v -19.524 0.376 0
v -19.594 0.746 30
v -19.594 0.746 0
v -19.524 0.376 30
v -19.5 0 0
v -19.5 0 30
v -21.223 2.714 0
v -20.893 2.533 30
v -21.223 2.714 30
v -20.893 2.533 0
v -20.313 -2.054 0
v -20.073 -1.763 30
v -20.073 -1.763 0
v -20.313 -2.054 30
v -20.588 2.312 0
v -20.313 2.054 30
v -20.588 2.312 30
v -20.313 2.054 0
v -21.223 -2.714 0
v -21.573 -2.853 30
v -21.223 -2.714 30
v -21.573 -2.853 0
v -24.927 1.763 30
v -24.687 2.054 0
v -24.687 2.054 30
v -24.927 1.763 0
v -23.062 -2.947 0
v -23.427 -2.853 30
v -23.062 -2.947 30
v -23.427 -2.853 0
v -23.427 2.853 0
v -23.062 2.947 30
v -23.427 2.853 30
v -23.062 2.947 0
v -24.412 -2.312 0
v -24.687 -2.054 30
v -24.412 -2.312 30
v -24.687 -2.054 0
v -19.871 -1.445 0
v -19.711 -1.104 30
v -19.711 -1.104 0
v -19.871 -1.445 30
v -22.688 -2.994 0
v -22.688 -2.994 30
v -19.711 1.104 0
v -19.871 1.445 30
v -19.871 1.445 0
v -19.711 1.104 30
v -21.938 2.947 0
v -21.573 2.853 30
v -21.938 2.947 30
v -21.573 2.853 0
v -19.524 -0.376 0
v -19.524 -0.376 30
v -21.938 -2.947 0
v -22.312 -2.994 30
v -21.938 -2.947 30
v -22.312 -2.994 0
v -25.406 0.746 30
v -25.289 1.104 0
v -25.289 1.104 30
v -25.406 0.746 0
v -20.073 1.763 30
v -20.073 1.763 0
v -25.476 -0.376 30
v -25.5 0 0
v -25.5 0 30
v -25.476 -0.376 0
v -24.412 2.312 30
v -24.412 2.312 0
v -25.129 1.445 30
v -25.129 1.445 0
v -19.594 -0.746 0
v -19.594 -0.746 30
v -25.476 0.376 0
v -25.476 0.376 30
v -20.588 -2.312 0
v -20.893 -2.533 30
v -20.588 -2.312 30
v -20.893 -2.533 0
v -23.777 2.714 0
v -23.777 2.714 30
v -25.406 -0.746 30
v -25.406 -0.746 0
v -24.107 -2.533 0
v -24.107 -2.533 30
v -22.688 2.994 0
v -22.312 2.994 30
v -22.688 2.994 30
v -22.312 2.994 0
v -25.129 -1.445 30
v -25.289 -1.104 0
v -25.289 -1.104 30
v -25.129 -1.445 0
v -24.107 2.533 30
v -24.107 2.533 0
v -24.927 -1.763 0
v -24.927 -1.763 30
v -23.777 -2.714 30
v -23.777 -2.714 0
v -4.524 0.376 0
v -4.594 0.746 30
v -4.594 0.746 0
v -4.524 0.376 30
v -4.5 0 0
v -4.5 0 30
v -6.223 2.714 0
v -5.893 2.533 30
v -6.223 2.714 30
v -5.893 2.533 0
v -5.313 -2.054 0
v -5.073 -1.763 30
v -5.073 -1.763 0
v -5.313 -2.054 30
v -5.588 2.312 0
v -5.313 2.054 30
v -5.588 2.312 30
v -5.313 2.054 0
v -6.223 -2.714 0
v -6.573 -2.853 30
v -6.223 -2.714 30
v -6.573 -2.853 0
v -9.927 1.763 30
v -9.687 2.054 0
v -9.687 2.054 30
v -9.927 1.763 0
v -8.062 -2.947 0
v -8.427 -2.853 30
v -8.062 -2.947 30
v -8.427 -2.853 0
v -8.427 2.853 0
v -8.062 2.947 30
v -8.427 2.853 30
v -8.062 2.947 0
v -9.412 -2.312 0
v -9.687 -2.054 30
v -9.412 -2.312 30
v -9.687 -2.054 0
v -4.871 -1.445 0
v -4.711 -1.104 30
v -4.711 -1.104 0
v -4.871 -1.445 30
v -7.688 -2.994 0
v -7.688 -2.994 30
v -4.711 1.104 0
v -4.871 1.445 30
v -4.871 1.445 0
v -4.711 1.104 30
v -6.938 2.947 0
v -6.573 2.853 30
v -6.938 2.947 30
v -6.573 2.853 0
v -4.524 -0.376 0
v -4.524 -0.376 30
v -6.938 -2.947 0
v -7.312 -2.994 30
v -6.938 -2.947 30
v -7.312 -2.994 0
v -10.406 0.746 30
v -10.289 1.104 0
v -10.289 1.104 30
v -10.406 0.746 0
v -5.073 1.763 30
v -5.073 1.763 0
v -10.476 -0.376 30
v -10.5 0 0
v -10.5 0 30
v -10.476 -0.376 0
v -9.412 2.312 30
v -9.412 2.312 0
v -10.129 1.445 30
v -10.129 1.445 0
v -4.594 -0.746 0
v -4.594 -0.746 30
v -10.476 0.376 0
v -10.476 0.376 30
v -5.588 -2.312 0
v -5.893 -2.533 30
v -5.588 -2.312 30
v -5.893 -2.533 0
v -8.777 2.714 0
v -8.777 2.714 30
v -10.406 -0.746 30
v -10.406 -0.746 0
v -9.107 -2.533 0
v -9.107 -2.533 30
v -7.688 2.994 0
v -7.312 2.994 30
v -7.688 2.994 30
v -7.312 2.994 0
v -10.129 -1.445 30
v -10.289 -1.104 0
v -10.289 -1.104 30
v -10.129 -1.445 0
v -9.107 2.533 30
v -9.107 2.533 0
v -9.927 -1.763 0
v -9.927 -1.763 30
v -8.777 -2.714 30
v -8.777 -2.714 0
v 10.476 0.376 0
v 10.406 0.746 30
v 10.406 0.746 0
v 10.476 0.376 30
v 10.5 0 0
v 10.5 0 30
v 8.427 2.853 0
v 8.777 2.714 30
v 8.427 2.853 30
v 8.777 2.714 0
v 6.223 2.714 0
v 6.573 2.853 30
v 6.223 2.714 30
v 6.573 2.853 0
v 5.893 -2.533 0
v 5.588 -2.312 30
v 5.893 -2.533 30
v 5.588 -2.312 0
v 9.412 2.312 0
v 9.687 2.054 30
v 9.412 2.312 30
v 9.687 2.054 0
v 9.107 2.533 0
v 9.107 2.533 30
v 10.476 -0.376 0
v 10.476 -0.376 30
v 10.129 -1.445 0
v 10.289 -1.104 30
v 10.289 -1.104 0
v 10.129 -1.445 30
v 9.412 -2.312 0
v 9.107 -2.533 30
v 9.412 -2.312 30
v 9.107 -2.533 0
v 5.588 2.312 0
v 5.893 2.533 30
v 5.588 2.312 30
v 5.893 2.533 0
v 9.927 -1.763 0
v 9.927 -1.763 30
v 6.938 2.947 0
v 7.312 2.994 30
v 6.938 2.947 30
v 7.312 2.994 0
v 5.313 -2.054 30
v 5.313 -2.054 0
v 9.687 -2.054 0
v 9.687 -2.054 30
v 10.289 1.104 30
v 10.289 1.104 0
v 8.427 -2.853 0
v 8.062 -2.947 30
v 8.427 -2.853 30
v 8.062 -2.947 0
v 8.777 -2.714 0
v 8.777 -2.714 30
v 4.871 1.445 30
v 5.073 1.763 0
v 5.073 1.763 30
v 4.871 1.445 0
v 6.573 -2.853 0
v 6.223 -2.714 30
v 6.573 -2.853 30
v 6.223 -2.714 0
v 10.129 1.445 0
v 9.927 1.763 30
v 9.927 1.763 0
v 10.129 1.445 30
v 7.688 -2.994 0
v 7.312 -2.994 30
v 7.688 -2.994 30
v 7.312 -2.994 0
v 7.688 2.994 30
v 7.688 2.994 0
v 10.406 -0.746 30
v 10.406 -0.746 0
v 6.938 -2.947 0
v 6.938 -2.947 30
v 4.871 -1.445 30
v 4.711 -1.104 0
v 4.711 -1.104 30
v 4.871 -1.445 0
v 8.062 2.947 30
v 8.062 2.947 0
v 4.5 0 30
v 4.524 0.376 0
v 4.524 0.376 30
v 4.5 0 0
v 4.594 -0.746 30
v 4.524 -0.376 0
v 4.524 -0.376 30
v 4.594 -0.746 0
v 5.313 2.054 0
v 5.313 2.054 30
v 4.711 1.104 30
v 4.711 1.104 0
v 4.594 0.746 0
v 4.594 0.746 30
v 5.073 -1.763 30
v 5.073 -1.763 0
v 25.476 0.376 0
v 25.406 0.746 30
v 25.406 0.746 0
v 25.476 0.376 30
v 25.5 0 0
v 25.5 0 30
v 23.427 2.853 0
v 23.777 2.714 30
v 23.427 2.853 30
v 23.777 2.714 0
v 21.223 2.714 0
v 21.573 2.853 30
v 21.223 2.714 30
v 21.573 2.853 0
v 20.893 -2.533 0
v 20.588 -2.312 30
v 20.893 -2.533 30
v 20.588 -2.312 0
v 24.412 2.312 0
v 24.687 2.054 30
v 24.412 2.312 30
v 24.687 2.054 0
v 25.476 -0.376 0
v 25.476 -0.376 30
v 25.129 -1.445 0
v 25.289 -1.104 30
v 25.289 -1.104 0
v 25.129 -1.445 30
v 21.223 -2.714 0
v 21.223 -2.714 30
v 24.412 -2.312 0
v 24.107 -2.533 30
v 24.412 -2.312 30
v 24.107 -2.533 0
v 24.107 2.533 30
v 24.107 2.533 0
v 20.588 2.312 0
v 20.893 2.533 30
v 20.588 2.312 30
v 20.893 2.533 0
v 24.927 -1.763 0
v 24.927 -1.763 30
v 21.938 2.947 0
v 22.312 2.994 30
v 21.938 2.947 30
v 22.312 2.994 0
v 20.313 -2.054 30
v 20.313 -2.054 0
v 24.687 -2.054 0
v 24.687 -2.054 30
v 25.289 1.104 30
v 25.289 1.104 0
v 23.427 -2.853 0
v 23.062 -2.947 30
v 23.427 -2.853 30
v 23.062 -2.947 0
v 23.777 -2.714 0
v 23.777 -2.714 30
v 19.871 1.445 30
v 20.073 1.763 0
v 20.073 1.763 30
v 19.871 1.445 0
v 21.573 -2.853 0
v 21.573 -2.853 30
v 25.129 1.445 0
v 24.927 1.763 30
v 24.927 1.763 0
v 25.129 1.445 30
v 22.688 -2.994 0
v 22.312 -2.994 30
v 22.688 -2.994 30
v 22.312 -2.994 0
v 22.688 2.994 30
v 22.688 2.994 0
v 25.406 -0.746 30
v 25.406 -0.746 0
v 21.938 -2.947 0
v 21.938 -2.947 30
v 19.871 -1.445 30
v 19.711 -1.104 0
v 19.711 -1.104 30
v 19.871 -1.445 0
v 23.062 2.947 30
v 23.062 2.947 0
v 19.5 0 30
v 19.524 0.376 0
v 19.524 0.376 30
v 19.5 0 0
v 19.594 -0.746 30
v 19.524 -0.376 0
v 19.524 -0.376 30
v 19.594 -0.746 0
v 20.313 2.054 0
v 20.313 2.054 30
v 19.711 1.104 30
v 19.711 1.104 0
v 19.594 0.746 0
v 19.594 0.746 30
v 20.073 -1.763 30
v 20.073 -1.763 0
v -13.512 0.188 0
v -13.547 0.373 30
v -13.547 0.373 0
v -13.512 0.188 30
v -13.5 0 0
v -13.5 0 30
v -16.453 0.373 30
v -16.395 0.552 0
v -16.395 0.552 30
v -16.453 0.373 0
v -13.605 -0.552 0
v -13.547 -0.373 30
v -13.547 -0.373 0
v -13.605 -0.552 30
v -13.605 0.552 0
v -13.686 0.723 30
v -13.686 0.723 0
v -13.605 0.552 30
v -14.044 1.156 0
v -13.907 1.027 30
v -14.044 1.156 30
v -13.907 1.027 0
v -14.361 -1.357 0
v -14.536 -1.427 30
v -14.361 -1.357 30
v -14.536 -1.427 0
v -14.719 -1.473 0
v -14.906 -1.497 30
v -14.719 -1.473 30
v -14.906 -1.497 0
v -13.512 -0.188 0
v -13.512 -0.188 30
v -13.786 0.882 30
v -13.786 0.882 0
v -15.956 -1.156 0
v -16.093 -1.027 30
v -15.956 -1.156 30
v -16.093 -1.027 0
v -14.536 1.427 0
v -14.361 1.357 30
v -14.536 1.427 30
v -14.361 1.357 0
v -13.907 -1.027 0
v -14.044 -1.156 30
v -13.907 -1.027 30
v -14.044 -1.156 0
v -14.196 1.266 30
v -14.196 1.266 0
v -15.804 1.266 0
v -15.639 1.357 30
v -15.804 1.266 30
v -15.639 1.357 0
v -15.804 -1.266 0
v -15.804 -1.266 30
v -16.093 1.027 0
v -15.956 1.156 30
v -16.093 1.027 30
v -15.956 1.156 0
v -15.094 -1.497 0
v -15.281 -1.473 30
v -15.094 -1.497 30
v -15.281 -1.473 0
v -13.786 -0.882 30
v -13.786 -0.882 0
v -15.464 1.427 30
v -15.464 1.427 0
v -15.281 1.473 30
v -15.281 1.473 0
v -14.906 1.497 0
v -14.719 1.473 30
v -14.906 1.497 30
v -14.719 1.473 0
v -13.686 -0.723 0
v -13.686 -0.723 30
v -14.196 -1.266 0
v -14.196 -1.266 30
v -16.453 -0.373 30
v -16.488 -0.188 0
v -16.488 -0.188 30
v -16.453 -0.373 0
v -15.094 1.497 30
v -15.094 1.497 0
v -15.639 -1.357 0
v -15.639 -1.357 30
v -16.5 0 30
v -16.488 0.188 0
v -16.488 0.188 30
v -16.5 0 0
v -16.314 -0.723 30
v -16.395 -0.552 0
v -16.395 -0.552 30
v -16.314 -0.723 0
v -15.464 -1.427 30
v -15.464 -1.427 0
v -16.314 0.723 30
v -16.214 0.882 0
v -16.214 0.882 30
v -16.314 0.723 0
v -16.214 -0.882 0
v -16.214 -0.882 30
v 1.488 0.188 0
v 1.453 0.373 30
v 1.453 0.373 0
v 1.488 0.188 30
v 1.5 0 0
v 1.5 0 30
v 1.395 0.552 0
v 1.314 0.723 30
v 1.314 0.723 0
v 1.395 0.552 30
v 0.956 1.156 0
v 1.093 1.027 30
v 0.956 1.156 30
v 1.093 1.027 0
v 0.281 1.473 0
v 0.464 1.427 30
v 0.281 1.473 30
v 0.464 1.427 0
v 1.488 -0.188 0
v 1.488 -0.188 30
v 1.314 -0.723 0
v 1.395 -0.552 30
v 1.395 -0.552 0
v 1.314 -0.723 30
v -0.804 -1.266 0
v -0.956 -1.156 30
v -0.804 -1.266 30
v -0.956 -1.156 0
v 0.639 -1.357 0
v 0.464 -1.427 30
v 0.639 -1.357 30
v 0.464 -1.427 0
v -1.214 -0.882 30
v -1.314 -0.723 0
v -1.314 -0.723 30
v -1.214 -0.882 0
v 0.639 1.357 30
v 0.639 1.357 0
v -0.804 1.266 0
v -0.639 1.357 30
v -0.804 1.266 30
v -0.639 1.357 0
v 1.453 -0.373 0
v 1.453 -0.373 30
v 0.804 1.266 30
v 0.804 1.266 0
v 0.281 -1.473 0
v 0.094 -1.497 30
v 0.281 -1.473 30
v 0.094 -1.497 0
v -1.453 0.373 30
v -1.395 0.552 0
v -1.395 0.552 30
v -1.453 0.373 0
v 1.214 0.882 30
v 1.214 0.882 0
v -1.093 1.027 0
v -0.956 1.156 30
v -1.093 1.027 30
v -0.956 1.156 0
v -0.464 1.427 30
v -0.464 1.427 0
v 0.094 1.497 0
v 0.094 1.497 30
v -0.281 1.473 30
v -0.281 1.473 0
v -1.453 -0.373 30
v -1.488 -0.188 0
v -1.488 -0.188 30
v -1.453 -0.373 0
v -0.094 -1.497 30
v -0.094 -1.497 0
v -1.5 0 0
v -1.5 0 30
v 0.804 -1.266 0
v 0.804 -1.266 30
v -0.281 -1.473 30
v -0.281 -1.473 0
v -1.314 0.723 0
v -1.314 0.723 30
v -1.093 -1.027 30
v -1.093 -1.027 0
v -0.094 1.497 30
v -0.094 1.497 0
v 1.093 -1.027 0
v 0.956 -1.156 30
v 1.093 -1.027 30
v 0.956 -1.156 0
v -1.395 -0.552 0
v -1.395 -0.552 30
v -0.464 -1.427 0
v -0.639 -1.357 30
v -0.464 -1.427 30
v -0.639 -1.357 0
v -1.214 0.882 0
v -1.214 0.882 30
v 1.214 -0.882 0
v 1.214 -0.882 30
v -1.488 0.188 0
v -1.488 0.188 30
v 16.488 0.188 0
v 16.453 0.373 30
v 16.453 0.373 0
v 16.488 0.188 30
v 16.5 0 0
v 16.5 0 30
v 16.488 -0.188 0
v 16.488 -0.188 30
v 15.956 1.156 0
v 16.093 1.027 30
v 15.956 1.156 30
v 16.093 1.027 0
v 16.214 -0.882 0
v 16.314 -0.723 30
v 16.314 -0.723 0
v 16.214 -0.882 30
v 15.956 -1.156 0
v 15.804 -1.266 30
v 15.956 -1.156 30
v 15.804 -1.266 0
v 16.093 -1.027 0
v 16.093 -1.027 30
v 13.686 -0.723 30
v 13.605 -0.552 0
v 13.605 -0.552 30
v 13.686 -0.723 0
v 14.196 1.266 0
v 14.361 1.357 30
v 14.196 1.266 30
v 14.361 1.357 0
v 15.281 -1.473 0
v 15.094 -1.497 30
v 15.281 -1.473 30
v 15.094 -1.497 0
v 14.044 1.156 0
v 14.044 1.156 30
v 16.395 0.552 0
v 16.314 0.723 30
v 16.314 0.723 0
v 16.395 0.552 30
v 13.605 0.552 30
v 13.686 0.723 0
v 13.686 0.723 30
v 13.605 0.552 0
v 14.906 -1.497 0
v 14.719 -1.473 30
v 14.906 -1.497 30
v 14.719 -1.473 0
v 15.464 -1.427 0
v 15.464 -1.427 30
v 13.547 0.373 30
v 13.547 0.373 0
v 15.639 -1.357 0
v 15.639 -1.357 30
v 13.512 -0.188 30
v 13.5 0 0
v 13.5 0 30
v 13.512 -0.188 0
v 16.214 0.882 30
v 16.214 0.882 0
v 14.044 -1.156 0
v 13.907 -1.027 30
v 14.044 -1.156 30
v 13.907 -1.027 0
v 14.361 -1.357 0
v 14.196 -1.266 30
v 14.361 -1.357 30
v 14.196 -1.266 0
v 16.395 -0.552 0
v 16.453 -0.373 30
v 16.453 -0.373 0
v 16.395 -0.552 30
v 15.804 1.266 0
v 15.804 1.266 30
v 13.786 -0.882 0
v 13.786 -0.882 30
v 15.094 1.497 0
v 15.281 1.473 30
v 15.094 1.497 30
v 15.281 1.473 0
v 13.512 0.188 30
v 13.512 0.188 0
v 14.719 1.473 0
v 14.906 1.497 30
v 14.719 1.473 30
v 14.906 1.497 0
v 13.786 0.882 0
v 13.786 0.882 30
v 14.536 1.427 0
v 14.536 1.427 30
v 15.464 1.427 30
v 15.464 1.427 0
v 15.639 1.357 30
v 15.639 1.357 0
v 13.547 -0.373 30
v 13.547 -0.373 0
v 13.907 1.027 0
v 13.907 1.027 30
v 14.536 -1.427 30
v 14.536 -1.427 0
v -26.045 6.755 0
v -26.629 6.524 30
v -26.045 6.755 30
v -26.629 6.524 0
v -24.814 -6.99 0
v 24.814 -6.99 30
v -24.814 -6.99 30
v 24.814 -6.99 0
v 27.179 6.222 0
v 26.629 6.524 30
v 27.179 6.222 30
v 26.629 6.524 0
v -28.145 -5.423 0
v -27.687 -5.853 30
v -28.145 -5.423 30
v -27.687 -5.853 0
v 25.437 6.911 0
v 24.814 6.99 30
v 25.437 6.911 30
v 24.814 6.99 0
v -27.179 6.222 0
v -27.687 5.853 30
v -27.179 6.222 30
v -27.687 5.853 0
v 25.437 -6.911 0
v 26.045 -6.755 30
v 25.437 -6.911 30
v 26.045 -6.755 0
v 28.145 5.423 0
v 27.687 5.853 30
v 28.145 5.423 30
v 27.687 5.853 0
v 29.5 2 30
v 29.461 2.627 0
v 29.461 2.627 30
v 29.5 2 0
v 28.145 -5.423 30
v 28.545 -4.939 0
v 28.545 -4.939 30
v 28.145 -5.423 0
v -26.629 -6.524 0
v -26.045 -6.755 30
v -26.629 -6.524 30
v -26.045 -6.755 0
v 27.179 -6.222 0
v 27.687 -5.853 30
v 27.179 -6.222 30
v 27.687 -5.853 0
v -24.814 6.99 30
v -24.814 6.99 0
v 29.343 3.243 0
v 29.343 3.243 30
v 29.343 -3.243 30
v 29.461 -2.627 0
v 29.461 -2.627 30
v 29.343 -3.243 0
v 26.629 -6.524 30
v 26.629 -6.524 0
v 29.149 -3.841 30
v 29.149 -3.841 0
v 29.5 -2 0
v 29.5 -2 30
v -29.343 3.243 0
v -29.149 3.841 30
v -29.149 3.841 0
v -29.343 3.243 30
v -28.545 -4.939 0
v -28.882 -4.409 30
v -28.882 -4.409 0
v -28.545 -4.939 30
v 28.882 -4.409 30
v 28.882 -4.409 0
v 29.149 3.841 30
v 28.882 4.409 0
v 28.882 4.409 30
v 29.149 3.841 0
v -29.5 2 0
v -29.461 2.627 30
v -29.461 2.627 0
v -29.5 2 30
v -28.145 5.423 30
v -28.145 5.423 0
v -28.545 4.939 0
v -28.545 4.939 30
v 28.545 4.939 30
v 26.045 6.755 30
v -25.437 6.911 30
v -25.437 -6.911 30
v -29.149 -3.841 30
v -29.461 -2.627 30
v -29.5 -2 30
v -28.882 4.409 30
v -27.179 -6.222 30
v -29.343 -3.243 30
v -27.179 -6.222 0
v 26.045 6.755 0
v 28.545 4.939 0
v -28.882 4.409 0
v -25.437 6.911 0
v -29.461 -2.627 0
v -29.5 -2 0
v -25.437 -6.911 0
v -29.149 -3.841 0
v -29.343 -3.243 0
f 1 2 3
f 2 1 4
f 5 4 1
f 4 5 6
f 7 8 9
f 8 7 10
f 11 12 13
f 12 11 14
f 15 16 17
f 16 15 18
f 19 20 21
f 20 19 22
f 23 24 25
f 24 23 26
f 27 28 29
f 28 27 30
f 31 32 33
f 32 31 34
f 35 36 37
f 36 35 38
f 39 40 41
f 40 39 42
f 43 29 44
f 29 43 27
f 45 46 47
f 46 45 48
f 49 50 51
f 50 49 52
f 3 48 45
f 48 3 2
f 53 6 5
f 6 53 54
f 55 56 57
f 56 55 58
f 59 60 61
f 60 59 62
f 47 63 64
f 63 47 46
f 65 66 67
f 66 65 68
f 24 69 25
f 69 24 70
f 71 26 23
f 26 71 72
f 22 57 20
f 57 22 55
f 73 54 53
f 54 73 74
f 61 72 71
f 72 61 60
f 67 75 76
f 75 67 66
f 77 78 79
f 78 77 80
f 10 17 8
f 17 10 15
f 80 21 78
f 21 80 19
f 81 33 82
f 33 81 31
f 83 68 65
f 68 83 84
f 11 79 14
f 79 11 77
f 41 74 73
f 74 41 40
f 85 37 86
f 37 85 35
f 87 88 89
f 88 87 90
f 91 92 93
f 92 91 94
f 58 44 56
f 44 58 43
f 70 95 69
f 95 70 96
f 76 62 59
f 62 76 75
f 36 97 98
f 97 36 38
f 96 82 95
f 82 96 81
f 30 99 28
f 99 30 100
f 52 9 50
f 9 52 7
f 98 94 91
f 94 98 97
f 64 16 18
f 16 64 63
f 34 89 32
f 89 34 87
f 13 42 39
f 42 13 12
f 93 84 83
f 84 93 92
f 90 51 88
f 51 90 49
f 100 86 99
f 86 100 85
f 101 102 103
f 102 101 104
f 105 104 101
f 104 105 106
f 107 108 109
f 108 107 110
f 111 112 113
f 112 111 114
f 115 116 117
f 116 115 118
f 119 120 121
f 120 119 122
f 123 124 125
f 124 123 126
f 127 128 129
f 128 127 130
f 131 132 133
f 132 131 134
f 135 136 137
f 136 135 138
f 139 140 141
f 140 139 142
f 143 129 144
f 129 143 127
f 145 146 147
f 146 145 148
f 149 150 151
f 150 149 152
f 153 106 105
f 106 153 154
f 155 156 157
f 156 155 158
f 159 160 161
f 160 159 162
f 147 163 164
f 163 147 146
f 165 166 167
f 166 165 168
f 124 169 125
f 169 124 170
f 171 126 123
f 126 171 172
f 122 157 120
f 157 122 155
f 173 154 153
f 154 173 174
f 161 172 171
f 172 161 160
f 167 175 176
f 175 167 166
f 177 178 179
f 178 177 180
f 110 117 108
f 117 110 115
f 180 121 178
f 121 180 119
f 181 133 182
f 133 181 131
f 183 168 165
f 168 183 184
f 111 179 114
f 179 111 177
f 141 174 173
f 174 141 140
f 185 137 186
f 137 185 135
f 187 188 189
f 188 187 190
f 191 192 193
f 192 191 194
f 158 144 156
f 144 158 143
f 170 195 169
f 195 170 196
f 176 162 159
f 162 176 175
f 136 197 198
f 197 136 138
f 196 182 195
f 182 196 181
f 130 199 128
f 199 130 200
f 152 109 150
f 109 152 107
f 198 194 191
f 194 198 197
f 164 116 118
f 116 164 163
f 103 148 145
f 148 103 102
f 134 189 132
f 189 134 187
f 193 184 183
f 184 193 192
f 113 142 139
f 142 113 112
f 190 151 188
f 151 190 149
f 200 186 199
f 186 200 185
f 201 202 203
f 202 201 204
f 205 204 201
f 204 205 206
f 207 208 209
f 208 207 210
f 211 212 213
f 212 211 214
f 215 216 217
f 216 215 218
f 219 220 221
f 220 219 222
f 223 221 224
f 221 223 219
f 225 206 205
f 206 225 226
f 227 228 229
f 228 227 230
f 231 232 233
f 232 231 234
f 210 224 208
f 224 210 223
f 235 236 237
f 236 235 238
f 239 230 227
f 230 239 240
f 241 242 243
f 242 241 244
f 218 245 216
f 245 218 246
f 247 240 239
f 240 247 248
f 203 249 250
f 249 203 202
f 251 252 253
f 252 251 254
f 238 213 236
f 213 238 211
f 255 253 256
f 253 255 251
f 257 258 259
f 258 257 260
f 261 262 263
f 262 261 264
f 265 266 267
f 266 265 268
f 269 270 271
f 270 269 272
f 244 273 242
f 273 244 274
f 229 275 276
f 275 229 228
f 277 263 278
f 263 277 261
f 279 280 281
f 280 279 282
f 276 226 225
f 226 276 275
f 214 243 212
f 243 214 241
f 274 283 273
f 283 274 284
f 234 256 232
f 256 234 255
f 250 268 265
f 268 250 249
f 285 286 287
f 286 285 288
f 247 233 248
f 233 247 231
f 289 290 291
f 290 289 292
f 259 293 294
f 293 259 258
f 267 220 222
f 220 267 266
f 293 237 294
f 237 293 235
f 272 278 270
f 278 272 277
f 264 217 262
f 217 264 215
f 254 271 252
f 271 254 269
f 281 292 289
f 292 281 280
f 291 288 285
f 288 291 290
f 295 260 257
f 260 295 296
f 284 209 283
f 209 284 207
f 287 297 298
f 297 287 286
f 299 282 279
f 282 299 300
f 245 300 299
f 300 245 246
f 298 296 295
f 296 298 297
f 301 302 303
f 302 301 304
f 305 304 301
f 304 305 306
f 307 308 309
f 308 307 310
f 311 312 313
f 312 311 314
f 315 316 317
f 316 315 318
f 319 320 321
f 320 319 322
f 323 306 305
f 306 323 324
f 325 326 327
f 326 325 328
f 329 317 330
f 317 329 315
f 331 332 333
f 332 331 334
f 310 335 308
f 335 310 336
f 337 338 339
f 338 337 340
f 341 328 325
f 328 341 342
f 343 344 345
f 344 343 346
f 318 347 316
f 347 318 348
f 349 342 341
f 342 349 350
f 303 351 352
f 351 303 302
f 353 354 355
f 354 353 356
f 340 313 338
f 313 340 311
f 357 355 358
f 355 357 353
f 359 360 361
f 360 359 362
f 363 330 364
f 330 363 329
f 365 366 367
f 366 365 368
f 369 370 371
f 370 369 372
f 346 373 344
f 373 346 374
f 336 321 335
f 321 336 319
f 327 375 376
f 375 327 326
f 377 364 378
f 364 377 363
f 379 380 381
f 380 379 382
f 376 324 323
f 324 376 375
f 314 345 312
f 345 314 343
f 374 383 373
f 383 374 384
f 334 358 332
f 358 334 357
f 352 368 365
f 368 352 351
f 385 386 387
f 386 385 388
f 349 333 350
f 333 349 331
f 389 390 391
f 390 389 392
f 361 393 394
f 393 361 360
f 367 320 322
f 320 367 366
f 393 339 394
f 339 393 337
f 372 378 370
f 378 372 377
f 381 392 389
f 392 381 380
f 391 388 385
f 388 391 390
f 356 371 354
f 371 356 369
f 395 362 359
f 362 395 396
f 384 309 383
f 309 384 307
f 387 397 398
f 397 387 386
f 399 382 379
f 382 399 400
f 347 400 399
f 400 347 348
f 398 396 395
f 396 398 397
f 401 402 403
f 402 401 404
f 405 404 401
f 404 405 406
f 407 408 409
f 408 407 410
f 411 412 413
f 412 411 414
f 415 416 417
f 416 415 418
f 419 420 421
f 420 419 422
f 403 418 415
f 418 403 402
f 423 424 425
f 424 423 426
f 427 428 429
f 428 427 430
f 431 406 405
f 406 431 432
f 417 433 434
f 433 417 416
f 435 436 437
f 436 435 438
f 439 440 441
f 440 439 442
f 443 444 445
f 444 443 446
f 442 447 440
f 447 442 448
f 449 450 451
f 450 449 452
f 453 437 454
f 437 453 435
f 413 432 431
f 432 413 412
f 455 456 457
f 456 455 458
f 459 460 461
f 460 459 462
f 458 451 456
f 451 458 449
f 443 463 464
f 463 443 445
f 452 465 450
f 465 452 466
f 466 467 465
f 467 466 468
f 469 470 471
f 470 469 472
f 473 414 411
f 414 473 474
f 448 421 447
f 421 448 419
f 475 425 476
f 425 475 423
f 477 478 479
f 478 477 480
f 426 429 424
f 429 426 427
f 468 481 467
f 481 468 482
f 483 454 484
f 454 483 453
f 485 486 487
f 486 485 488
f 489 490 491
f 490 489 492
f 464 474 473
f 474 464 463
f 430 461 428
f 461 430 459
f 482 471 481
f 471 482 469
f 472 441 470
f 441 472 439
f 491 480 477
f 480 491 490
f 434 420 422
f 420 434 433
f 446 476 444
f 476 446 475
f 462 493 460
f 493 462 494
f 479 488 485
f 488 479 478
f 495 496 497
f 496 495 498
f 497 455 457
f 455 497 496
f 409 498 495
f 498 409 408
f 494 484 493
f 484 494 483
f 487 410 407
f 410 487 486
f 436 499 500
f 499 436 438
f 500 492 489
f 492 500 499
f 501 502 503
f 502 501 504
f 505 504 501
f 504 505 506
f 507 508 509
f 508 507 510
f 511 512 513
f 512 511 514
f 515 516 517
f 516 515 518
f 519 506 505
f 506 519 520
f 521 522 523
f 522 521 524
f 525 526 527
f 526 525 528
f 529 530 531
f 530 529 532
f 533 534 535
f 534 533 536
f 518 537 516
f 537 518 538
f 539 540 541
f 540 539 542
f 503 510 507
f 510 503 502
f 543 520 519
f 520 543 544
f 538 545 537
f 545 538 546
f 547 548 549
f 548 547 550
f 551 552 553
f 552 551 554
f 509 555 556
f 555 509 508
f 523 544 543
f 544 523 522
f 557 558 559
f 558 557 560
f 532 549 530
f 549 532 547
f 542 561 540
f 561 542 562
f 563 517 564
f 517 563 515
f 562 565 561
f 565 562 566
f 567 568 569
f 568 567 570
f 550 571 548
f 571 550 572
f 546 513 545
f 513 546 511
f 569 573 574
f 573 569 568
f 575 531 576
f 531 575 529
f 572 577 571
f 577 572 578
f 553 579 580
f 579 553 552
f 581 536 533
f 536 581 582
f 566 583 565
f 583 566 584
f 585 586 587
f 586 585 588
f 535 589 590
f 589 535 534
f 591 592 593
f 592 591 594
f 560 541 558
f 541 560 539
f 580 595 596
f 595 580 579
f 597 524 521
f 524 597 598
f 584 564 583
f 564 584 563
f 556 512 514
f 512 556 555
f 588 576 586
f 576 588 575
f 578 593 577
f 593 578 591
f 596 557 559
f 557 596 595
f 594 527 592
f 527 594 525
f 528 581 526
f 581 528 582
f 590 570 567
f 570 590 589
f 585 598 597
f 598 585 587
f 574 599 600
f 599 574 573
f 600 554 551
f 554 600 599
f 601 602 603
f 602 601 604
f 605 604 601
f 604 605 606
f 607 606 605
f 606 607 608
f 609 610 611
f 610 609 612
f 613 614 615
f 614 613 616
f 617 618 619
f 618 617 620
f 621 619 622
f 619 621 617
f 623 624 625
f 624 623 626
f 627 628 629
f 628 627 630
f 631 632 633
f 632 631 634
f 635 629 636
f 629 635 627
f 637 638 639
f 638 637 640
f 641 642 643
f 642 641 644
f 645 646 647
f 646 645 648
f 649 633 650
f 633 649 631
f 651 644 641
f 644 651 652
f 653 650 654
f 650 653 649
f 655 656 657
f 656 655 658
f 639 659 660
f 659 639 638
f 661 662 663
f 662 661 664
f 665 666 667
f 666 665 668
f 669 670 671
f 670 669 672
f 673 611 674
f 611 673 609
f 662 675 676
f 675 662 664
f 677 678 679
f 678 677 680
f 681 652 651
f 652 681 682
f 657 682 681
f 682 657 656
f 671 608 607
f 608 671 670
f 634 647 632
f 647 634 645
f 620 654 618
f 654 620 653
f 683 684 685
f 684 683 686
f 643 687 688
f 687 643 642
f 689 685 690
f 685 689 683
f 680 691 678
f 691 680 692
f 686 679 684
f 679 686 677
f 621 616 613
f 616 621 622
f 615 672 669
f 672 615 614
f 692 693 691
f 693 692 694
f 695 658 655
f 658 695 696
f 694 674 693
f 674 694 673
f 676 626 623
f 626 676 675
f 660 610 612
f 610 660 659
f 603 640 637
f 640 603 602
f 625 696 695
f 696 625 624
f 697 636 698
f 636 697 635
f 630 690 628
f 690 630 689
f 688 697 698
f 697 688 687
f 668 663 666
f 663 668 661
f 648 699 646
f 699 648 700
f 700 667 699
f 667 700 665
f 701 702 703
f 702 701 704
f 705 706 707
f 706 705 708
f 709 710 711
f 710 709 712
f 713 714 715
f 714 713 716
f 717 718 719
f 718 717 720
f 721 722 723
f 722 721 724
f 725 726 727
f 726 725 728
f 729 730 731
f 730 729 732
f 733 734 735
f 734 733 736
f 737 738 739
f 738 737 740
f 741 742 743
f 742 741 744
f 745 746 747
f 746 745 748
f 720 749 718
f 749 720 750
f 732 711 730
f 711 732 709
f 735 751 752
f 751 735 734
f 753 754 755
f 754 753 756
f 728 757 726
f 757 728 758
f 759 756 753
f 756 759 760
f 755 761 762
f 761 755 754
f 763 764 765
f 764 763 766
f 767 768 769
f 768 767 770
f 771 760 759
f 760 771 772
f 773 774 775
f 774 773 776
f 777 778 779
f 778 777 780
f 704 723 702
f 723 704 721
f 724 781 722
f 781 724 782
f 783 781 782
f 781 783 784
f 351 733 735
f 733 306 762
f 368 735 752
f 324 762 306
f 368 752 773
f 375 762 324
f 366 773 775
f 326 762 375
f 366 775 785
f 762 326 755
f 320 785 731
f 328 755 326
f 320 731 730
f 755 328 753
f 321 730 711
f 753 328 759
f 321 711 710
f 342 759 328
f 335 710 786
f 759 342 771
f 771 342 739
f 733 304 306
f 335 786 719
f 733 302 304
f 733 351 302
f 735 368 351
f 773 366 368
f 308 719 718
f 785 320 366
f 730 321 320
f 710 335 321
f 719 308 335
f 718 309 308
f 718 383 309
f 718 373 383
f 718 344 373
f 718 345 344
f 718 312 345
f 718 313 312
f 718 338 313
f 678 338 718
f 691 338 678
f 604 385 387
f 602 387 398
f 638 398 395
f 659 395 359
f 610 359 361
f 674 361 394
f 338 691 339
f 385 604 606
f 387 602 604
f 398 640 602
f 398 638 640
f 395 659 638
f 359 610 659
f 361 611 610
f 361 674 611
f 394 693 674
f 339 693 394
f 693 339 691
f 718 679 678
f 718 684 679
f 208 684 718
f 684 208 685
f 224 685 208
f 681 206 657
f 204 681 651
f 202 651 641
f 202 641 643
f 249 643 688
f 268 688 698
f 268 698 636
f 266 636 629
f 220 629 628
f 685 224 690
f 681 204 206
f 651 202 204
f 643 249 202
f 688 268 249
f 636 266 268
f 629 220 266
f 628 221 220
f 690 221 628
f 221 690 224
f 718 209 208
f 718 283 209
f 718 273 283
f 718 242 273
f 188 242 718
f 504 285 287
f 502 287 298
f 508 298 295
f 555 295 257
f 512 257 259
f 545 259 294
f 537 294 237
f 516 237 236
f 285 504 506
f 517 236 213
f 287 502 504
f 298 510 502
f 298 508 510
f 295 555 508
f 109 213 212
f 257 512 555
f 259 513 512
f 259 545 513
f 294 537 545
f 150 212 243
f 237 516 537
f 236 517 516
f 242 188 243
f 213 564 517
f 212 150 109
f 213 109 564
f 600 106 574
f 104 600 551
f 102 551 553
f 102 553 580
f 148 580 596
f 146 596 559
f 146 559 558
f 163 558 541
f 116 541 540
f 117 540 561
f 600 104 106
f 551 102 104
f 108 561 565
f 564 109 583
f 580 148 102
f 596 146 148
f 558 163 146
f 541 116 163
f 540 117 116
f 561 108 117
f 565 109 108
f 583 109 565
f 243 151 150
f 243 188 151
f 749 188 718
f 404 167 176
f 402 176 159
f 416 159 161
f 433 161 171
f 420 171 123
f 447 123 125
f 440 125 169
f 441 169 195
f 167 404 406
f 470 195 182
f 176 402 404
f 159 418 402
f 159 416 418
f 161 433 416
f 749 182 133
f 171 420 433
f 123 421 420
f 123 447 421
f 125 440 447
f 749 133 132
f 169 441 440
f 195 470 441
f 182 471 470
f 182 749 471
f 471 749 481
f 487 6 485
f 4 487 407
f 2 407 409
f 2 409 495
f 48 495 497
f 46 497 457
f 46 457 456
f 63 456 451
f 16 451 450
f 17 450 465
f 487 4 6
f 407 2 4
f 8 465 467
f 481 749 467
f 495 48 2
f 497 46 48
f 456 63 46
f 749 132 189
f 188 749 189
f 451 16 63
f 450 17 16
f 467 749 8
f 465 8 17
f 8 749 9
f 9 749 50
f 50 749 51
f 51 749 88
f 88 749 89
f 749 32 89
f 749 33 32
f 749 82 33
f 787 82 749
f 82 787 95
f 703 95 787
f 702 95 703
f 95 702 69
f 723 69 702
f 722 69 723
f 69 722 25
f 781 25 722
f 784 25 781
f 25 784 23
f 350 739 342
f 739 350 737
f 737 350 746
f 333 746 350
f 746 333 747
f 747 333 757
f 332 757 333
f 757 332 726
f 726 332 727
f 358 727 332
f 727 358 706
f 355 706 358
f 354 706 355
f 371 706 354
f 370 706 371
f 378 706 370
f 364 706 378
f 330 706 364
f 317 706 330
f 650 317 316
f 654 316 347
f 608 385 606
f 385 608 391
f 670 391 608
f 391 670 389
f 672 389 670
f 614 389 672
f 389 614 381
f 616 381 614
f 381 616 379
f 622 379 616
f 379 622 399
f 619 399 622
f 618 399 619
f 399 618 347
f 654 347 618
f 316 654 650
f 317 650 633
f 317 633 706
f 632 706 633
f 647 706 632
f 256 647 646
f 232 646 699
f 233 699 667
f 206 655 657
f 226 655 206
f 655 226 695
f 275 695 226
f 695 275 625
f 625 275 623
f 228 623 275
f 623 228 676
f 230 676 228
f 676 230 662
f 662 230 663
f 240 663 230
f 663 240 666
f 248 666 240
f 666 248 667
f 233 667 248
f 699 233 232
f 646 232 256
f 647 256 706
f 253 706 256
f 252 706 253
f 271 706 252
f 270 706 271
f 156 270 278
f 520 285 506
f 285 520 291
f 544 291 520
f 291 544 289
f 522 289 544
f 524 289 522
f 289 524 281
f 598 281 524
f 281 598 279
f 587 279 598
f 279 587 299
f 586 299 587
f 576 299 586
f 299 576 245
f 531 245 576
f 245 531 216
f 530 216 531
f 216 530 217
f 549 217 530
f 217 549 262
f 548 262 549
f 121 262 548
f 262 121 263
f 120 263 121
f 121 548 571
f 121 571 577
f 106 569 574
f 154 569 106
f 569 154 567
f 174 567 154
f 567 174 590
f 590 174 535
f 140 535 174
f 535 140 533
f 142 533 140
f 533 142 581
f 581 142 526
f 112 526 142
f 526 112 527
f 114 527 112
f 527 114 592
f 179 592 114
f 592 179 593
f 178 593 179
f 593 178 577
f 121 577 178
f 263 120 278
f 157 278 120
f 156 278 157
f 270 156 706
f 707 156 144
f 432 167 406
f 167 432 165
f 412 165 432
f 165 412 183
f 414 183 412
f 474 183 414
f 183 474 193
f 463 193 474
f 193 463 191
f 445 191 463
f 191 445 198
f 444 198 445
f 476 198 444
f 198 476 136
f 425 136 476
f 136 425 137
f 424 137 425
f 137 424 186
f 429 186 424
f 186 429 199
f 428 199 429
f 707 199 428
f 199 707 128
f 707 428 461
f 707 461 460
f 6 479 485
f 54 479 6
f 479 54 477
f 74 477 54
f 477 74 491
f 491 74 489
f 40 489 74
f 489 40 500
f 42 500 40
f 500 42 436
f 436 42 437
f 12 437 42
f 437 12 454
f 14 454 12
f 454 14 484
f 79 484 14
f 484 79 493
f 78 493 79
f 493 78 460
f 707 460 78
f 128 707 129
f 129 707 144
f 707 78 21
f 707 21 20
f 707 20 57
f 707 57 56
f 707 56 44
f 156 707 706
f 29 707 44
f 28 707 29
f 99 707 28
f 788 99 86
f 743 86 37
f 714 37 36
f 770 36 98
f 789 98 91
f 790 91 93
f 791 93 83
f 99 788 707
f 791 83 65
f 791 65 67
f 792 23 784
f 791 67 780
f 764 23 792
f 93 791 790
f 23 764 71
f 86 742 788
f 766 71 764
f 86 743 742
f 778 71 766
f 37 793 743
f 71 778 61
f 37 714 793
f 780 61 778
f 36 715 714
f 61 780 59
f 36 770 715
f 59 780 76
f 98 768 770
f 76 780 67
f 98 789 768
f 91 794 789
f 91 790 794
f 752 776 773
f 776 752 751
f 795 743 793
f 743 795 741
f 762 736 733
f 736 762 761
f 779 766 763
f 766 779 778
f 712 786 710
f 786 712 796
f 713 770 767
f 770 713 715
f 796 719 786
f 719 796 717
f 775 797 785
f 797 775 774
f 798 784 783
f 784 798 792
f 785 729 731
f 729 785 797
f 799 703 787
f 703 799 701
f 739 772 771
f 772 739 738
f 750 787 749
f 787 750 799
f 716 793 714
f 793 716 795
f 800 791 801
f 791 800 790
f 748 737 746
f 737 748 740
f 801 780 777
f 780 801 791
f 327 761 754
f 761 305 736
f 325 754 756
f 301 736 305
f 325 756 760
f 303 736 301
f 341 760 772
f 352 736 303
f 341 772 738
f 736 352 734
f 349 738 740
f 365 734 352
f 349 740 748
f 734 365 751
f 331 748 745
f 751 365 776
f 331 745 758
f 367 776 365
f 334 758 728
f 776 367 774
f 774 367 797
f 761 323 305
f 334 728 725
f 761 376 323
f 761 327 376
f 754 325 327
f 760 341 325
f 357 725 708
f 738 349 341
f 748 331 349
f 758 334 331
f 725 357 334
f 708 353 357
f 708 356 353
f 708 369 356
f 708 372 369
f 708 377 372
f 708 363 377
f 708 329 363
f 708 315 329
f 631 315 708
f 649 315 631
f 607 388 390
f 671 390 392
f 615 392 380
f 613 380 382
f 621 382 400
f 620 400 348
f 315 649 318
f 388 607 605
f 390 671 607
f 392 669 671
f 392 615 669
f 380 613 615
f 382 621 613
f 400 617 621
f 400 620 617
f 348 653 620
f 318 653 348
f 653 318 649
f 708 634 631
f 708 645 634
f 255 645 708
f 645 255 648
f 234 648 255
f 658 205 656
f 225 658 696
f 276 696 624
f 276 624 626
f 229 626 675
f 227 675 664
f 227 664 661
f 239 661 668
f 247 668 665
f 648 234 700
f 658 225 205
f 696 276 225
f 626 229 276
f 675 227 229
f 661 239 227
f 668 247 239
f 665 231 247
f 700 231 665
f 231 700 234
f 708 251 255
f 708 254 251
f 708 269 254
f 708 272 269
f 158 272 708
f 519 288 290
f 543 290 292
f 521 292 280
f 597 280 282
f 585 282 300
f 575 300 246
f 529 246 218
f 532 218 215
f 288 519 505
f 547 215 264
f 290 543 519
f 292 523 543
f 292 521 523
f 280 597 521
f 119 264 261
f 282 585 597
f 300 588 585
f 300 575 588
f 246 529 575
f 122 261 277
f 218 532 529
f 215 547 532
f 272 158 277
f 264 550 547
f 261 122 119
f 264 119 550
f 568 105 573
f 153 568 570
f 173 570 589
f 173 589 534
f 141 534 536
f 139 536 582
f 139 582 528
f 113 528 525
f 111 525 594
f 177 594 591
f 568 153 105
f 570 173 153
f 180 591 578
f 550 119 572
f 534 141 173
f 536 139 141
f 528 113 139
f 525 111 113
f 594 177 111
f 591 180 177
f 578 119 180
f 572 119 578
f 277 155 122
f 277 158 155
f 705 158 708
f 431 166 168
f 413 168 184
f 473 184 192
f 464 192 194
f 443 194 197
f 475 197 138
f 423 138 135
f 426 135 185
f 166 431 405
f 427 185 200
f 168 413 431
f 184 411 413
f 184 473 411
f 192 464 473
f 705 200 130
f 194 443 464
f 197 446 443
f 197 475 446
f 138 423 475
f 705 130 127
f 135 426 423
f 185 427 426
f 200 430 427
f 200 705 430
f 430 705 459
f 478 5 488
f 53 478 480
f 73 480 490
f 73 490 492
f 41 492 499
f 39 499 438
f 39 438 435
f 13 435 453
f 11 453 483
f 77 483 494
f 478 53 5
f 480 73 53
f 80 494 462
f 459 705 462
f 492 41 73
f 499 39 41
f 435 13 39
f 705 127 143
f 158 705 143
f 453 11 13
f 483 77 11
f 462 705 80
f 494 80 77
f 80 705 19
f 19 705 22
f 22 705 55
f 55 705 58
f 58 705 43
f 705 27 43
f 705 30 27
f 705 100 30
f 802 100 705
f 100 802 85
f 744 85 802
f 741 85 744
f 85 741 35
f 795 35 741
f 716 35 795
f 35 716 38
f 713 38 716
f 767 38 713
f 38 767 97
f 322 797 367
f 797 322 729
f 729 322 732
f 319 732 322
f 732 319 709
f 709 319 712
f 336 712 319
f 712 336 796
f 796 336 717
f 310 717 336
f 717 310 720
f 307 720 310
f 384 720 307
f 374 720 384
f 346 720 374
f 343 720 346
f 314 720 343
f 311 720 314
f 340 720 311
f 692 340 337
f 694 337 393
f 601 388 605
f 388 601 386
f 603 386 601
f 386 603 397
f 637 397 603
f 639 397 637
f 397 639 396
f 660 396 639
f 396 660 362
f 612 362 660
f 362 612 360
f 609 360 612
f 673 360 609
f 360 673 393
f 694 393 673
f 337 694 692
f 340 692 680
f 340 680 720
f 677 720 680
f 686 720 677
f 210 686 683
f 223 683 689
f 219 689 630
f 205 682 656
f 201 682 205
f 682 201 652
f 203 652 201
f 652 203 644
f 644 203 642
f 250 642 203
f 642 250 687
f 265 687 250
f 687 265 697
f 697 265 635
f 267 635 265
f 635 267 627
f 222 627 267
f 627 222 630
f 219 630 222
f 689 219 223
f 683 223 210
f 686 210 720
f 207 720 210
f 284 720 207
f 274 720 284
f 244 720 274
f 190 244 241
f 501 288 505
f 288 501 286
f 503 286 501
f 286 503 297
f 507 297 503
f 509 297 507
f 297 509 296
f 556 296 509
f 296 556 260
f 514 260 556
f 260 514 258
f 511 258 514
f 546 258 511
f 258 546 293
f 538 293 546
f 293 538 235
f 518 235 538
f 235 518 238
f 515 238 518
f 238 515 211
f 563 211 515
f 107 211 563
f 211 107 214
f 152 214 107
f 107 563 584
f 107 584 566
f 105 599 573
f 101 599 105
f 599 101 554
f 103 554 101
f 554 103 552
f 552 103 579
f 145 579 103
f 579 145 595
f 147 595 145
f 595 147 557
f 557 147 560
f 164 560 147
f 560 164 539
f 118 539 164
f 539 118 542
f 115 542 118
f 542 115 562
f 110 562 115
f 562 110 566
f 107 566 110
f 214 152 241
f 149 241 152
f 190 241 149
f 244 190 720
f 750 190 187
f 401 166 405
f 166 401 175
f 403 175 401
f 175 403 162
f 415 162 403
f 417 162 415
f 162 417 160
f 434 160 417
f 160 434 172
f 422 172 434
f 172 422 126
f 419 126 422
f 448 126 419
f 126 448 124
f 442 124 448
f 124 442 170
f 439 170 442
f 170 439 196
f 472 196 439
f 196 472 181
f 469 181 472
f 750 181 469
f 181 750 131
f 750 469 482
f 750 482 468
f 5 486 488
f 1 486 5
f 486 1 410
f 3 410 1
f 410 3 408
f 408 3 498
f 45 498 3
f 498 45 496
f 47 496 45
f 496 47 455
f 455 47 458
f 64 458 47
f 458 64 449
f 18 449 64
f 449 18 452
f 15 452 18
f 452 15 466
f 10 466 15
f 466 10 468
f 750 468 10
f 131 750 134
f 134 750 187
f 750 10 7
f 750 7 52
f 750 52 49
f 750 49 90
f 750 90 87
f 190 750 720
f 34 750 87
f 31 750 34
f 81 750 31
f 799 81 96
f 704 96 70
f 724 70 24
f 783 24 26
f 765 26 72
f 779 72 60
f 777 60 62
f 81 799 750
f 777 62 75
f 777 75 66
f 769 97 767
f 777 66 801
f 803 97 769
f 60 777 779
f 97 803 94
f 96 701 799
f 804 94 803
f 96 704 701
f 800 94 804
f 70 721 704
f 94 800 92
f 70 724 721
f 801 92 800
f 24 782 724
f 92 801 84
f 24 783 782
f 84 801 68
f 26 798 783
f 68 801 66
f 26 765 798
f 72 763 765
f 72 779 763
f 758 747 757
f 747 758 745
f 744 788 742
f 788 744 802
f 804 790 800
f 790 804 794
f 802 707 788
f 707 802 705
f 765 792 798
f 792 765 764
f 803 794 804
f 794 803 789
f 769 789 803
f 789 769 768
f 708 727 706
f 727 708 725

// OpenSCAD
$fn = 50;


difference() {
	union() {
		*color(alpha = 1.0000000000, c = "gray") {
			translate(v = [0, 7, 0]) {
				linear_extrude(height = 1) {
					text(font = "Arial:style=Bold", halign = "center", size = 4.5000000000, text = "COMMENT plate main", valign = "center");
				}
			}
		}
		hull() {
			translate(v = [-24.5000000000, 2.0000000000, 0]) {
				cylinder(h = 30, r = 5);
			}
			translate(v = [24.5000000000, 2.0000000000, 0]) {
				cylinder(h = 30, r = 5);
			}
			translate(v = [-24.5000000000, -2.0000000000, 0]) {
				cylinder(h = 30, r = 5);
			}
			translate(v = [24.5000000000, -2.0000000000, 0]) {
				cylinder(h = 30, r = 5);
			}
		}
	}
	union() {
		*color(alpha = 1.0000000000, c = "gray") {
			translate(v = [0, 7, 0]) {
				linear_extrude(height = 1) {
					text(font = "Arial:style=Bold", halign = "center", size = 4.5000000000, text = "COMMENT holes main", valign = "center");
				}
			}
		}
		translate(v = [-22.5000000000, 0.0000000000, 0]) {
			translate(v = [0, 0, -100]) {
				cylinder(h = 200, r = 3.0000000000);
			}
		}
		translate(v = [-7.5000000000, 0.0000000000, 0]) {
			translate(v = [0, 0, -100]) {
				cylinder(h = 200, r = 3.0000000000);
			}
		}
		translate(v = [7.5000000000, 0.0000000000, 0]) {
			translate(v = [0, 0, -100]) {
				cylinder(h = 200, r = 3.0000000000);
			}
		}
		translate(v = [22.5000000000, 0.0000000000, 0]) {
			translate(v = [0, 0, -100]) {
				cylinder(h = 200, r = 3.0000000000);
			}
		}
		translate(v = [-22.5000000000, 0.0000000000, 0]) {
			translate(v = [0, 0, -100]) {
				cylinder(h = 200, r = 1.5000000000);
			}
		}
		translate(v = [-15.0000000000, 0.0000000000, 0]) {
			translate(v = [0, 0, -100]) {
				cylinder(h = 200, r = 1.5000000000);
			}
		}
		translate(v = [-7.5000000000, 0.0000000000, 0]) {
			translate(v = [0, 0, -100]) {
				cylinder(h = 200, r = 1.5000000000);
			}
		}
		translate(v = [0, 0, -100]) {
			cylinder(h = 200, r = 1.5000000000);
		}
		translate(v = [7.5000000000, 0.0000000000, 0]) {
			translate(v = [0, 0, -100]) {
				cylinder(h = 200, r = 1.5000000000);
			}
		}
		translate(v = [15.0000000000, 0.0000000000, 0]) {
			translate(v = [0, 0, -100]) {
				cylinder(h = 200, r = 1.5000000000);
			}
		}
		translate(v = [22.5000000000, 0.0000000000, 0]) {
			translate(v = [0, 0, -100]) {
				cylinder(h = 200, r = 1.5000000000);
			}
		}
	}
}
